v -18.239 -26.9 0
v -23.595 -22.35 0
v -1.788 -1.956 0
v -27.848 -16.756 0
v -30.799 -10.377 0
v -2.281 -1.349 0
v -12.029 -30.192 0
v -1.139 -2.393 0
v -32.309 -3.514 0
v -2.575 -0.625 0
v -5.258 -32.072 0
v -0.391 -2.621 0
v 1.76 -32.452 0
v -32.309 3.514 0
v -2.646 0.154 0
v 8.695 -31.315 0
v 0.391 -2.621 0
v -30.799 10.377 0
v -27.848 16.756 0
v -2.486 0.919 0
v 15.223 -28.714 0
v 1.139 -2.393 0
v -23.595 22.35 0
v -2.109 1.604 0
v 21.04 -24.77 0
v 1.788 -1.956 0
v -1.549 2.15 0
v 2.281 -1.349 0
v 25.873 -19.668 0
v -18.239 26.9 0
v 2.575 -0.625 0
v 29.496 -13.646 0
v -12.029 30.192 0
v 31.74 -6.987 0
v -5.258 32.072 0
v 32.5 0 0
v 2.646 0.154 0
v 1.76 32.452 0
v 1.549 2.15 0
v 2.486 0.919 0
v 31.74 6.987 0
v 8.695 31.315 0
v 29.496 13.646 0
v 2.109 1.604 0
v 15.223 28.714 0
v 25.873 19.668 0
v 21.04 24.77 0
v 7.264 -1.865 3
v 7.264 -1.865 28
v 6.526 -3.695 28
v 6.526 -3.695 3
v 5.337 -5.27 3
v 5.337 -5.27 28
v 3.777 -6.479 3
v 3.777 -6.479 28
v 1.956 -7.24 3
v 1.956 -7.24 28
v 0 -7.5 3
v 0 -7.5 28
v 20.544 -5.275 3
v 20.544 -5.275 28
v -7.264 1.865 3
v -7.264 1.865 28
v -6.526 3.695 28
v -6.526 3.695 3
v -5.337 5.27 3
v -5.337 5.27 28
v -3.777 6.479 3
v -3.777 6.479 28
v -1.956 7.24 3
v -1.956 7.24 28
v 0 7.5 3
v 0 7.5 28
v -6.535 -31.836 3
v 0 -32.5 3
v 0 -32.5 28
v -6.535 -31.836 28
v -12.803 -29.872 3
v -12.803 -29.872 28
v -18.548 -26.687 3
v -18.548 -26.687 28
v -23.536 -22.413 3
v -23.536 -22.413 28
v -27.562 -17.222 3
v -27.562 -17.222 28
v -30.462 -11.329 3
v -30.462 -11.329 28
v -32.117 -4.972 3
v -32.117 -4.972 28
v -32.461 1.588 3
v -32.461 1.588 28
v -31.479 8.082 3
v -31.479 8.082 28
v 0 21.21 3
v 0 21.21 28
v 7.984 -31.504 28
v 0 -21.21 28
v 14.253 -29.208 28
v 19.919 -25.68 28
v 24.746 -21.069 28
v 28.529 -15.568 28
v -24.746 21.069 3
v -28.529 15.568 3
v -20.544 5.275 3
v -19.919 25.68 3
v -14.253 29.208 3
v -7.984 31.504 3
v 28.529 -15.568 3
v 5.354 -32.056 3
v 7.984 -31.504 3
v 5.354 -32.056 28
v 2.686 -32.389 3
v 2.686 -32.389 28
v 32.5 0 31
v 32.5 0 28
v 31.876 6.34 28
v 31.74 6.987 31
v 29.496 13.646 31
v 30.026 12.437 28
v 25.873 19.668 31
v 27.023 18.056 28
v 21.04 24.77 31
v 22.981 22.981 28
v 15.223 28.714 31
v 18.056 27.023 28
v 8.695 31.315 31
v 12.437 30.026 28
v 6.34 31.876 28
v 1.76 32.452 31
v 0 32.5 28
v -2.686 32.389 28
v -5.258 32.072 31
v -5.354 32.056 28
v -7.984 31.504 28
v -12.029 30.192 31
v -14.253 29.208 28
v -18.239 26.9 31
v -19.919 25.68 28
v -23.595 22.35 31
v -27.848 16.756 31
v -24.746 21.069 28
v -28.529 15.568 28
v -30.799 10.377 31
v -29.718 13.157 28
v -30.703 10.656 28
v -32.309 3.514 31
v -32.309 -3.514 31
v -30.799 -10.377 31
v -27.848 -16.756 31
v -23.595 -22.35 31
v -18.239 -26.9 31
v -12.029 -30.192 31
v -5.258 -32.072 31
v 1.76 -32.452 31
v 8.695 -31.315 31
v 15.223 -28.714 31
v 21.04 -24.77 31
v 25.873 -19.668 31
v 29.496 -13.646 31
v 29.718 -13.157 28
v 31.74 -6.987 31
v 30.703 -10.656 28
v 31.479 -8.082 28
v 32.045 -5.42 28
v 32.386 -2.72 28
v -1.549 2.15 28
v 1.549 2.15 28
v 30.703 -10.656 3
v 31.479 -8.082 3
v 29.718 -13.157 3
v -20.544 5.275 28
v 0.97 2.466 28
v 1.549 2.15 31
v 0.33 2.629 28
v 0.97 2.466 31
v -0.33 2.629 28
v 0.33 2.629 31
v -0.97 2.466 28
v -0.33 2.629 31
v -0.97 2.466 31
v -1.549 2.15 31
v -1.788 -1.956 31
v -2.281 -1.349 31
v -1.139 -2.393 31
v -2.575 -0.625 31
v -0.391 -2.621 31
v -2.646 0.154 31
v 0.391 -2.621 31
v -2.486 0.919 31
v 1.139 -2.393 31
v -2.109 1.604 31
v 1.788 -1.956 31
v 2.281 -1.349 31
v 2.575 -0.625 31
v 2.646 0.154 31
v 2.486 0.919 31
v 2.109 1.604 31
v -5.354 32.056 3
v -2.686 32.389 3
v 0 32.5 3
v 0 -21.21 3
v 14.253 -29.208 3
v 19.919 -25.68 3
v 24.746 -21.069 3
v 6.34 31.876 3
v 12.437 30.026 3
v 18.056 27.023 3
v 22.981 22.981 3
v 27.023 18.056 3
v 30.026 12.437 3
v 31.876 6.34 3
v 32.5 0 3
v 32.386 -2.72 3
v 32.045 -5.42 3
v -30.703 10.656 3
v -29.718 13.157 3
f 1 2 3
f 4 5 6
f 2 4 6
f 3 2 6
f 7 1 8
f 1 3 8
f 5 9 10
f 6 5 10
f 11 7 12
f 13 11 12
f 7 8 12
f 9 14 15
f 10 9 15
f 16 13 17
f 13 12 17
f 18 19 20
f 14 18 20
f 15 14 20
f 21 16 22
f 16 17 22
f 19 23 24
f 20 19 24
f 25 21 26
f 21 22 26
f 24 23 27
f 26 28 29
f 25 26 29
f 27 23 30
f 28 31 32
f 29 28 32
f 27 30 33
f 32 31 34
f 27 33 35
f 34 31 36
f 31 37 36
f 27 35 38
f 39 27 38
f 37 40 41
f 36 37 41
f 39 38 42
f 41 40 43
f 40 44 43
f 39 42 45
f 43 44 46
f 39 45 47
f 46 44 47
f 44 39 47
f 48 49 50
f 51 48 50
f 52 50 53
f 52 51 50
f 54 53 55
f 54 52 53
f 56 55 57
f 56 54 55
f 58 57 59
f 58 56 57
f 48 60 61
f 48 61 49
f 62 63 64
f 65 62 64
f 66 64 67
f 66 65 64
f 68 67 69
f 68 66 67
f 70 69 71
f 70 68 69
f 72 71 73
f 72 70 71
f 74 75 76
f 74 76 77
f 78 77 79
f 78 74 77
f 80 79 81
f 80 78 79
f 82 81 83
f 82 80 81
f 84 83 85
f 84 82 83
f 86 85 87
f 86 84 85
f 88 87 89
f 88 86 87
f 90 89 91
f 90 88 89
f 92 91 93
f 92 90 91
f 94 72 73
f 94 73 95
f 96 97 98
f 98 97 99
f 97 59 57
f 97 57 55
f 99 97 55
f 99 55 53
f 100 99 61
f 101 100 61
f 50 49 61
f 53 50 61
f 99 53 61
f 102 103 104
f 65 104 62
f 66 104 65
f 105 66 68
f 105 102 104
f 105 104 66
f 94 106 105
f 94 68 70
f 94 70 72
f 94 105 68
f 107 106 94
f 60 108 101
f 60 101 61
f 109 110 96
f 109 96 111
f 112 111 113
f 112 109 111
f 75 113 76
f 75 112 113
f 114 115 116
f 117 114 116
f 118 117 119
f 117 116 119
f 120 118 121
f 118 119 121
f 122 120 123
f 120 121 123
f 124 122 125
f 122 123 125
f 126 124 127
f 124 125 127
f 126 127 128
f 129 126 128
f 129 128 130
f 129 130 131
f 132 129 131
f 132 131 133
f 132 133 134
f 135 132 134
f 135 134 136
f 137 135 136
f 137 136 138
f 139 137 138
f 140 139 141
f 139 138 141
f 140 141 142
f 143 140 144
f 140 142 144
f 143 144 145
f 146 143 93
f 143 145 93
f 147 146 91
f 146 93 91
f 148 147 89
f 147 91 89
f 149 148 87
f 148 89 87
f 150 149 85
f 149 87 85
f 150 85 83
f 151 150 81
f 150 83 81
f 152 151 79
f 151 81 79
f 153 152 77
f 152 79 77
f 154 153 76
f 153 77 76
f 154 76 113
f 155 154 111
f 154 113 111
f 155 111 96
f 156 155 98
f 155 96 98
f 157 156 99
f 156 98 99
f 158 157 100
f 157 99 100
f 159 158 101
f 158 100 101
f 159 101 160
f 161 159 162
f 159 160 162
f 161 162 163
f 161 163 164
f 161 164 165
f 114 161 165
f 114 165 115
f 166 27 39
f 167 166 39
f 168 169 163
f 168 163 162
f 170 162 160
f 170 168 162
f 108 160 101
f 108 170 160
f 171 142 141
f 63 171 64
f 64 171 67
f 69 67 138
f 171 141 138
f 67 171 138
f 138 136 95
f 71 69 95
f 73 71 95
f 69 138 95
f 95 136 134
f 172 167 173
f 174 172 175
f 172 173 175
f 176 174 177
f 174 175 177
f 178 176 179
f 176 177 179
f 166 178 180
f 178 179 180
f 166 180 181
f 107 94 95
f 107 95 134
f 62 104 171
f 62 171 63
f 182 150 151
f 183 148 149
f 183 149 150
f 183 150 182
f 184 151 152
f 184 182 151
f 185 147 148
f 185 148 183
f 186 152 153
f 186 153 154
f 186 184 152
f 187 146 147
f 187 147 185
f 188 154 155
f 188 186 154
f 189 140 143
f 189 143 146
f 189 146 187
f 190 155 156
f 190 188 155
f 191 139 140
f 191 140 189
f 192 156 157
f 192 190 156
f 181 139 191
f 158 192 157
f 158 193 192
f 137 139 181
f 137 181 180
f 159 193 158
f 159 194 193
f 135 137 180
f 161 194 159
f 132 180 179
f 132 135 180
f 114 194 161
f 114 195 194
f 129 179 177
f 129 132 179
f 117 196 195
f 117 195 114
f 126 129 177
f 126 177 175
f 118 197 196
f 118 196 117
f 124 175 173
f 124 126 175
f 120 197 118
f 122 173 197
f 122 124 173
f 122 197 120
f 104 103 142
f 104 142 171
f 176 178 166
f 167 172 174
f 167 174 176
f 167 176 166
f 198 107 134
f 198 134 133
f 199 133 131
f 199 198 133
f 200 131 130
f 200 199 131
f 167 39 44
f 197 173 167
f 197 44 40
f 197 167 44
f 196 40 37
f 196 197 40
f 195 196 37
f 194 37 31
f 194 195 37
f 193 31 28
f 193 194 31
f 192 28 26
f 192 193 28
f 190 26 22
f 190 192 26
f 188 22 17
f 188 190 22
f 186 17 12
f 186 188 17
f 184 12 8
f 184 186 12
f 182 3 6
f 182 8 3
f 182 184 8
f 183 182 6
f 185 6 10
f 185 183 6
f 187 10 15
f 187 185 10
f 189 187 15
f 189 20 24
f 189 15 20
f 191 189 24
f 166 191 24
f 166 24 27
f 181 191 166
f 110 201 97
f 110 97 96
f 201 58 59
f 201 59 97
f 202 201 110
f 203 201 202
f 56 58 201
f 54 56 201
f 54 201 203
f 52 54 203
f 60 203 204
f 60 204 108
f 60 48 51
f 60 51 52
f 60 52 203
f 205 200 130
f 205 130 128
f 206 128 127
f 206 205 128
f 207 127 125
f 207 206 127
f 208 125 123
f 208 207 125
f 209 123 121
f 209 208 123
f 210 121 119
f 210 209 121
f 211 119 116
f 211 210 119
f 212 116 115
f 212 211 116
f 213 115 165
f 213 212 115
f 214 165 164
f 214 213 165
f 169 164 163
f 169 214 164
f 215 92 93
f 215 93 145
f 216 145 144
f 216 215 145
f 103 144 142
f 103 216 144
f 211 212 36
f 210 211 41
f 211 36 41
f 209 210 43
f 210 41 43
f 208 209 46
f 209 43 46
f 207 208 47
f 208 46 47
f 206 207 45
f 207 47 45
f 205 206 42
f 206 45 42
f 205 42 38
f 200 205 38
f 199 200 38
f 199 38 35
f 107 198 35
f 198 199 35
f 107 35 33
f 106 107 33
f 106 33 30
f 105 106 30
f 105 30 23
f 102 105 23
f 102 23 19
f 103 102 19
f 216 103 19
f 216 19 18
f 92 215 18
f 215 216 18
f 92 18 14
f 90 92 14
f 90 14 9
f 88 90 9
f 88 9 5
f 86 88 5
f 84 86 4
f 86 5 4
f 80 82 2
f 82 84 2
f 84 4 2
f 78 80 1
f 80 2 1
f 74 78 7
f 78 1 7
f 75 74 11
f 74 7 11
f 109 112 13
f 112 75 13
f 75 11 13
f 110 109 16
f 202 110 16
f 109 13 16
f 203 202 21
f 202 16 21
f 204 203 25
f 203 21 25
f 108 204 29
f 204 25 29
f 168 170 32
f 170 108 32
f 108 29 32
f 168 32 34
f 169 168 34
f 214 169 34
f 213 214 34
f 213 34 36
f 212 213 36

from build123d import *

# Parameters (mm, degrees)
SKETCH2_R           = 32.5
BOSS_EXTRUDE1_DEPTH = 3
BOSS_EXTRUDE2_DEPTH = 25
SKETCH4_R           = 32.5
BOSS_EXTRUDE3_DEPTH = 3
CUT_EXTRUDE1_DEPTH  = 56.439155838
SKETCH7_R           = 2.65
CUT_EXTRUDE2_DEPTH  = 3


with BuildPart() as part:
    # Sketch2 → Boss-Extrude1 (new body)
    with BuildSketch(Plane.XY):
        Circle(SKETCH2_R)
    extrude(amount=BOSS_EXTRUDE1_DEPTH)

    # Sketch3 → Boss-Extrude2 (add)
    with BuildSketch(Plane.XY.offset(3)):
        with BuildLine():
            Line((0, 7.5), (0, 21.210393848))
            Line((0, 21.210393848), (-7.984489127, 31.503935205))
            ThreePointArc((-7.984489127, 31.503935205), (-4.023189397, 32.250022435), (0, 32.5))
            ThreePointArc((0, 32.5), (25.680037902, 19.919479244), (31.478952737, -8.082421333))
            ThreePointArc((31.478952737, -8.082421333), (30.23630216, -11.917047944), (28.528519449, -15.56835181))
            Line((28.528519449, -15.56835181), (20.544030322, -5.274810453))
            Line((20.544030322, -5.274810453), (7.264373708, -1.865174154))
            ThreePointArc((7.264373708, -1.865174154), (4.596802902, -5.926162593), (0, -7.5))
            Line((0, -7.5), (0, -21.210393848))
            Line((0, -21.210393848), (7.984489127, -31.503935205))
            ThreePointArc((7.984489127, -31.503935205), (4.023189397, -32.250022435), (0, -32.5))
            ThreePointArc((0, -32.5), (-25.680037902, -19.919479244), (-31.478952737, 8.082421333))
            ThreePointArc((-31.478952737, 8.082421333), (-30.23630216, 11.917047944), (-28.528519449, 15.56835181))
            Line((-28.528519449, 15.56835181), (-20.544030322, 5.274810453))
            Line((-20.544030322, 5.274810453), (-7.264373708, 1.865174154))
            ThreePointArc((-7.264373708, 1.865174154), (-4.596802902, 5.926162593), (0, 7.5))
        make_face()
    extrude(amount=BOSS_EXTRUDE2_DEPTH)

    # Sketch4 → Boss-Extrude3 (add)
    with BuildSketch(Plane.XY.offset(28)):
        Circle(SKETCH4_R)
    extrude(amount=BOSS_EXTRUDE3_DEPTH)

    # Sketch5 → Cut-Extrude1 (cut, through all)
    with BuildSketch(Plane.XY.offset(31)):
        with BuildLine():
            Line((-1.549193338, 2.15), (1.549193338, 2.15))
            ThreePointArc((1.549193338, 2.15), (0, -2.65), (-1.549193338, 2.15))
        make_face()
    extrude(amount=-CUT_EXTRUDE1_DEPTH, mode=Mode.SUBTRACT)

    # Sketch7 → Cut-Extrude2 (cut)
    with BuildSketch(Plane.XY.offset(31)):
        Circle(SKETCH7_R)
    extrude(amount=-CUT_EXTRUDE2_DEPTH, mode=Mode.SUBTRACT)


solid = part.part
